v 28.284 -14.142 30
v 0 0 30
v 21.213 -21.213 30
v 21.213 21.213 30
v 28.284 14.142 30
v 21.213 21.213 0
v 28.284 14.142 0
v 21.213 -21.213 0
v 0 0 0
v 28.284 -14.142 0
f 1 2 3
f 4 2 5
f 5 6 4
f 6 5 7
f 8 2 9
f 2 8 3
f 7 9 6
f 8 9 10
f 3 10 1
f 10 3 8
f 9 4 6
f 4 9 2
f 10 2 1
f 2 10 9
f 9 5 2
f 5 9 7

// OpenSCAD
rotate([0,0,-90])
rotate([0,-90,0]){
    difference(){
        rotate([-45,0,0]) {
            cube([30, 30, 30]);
        }
        scale([1,2,1]) {
            rotate([-45,0,0]) {
                cube([30, 30, 30]);
            }
        }
    }
}
